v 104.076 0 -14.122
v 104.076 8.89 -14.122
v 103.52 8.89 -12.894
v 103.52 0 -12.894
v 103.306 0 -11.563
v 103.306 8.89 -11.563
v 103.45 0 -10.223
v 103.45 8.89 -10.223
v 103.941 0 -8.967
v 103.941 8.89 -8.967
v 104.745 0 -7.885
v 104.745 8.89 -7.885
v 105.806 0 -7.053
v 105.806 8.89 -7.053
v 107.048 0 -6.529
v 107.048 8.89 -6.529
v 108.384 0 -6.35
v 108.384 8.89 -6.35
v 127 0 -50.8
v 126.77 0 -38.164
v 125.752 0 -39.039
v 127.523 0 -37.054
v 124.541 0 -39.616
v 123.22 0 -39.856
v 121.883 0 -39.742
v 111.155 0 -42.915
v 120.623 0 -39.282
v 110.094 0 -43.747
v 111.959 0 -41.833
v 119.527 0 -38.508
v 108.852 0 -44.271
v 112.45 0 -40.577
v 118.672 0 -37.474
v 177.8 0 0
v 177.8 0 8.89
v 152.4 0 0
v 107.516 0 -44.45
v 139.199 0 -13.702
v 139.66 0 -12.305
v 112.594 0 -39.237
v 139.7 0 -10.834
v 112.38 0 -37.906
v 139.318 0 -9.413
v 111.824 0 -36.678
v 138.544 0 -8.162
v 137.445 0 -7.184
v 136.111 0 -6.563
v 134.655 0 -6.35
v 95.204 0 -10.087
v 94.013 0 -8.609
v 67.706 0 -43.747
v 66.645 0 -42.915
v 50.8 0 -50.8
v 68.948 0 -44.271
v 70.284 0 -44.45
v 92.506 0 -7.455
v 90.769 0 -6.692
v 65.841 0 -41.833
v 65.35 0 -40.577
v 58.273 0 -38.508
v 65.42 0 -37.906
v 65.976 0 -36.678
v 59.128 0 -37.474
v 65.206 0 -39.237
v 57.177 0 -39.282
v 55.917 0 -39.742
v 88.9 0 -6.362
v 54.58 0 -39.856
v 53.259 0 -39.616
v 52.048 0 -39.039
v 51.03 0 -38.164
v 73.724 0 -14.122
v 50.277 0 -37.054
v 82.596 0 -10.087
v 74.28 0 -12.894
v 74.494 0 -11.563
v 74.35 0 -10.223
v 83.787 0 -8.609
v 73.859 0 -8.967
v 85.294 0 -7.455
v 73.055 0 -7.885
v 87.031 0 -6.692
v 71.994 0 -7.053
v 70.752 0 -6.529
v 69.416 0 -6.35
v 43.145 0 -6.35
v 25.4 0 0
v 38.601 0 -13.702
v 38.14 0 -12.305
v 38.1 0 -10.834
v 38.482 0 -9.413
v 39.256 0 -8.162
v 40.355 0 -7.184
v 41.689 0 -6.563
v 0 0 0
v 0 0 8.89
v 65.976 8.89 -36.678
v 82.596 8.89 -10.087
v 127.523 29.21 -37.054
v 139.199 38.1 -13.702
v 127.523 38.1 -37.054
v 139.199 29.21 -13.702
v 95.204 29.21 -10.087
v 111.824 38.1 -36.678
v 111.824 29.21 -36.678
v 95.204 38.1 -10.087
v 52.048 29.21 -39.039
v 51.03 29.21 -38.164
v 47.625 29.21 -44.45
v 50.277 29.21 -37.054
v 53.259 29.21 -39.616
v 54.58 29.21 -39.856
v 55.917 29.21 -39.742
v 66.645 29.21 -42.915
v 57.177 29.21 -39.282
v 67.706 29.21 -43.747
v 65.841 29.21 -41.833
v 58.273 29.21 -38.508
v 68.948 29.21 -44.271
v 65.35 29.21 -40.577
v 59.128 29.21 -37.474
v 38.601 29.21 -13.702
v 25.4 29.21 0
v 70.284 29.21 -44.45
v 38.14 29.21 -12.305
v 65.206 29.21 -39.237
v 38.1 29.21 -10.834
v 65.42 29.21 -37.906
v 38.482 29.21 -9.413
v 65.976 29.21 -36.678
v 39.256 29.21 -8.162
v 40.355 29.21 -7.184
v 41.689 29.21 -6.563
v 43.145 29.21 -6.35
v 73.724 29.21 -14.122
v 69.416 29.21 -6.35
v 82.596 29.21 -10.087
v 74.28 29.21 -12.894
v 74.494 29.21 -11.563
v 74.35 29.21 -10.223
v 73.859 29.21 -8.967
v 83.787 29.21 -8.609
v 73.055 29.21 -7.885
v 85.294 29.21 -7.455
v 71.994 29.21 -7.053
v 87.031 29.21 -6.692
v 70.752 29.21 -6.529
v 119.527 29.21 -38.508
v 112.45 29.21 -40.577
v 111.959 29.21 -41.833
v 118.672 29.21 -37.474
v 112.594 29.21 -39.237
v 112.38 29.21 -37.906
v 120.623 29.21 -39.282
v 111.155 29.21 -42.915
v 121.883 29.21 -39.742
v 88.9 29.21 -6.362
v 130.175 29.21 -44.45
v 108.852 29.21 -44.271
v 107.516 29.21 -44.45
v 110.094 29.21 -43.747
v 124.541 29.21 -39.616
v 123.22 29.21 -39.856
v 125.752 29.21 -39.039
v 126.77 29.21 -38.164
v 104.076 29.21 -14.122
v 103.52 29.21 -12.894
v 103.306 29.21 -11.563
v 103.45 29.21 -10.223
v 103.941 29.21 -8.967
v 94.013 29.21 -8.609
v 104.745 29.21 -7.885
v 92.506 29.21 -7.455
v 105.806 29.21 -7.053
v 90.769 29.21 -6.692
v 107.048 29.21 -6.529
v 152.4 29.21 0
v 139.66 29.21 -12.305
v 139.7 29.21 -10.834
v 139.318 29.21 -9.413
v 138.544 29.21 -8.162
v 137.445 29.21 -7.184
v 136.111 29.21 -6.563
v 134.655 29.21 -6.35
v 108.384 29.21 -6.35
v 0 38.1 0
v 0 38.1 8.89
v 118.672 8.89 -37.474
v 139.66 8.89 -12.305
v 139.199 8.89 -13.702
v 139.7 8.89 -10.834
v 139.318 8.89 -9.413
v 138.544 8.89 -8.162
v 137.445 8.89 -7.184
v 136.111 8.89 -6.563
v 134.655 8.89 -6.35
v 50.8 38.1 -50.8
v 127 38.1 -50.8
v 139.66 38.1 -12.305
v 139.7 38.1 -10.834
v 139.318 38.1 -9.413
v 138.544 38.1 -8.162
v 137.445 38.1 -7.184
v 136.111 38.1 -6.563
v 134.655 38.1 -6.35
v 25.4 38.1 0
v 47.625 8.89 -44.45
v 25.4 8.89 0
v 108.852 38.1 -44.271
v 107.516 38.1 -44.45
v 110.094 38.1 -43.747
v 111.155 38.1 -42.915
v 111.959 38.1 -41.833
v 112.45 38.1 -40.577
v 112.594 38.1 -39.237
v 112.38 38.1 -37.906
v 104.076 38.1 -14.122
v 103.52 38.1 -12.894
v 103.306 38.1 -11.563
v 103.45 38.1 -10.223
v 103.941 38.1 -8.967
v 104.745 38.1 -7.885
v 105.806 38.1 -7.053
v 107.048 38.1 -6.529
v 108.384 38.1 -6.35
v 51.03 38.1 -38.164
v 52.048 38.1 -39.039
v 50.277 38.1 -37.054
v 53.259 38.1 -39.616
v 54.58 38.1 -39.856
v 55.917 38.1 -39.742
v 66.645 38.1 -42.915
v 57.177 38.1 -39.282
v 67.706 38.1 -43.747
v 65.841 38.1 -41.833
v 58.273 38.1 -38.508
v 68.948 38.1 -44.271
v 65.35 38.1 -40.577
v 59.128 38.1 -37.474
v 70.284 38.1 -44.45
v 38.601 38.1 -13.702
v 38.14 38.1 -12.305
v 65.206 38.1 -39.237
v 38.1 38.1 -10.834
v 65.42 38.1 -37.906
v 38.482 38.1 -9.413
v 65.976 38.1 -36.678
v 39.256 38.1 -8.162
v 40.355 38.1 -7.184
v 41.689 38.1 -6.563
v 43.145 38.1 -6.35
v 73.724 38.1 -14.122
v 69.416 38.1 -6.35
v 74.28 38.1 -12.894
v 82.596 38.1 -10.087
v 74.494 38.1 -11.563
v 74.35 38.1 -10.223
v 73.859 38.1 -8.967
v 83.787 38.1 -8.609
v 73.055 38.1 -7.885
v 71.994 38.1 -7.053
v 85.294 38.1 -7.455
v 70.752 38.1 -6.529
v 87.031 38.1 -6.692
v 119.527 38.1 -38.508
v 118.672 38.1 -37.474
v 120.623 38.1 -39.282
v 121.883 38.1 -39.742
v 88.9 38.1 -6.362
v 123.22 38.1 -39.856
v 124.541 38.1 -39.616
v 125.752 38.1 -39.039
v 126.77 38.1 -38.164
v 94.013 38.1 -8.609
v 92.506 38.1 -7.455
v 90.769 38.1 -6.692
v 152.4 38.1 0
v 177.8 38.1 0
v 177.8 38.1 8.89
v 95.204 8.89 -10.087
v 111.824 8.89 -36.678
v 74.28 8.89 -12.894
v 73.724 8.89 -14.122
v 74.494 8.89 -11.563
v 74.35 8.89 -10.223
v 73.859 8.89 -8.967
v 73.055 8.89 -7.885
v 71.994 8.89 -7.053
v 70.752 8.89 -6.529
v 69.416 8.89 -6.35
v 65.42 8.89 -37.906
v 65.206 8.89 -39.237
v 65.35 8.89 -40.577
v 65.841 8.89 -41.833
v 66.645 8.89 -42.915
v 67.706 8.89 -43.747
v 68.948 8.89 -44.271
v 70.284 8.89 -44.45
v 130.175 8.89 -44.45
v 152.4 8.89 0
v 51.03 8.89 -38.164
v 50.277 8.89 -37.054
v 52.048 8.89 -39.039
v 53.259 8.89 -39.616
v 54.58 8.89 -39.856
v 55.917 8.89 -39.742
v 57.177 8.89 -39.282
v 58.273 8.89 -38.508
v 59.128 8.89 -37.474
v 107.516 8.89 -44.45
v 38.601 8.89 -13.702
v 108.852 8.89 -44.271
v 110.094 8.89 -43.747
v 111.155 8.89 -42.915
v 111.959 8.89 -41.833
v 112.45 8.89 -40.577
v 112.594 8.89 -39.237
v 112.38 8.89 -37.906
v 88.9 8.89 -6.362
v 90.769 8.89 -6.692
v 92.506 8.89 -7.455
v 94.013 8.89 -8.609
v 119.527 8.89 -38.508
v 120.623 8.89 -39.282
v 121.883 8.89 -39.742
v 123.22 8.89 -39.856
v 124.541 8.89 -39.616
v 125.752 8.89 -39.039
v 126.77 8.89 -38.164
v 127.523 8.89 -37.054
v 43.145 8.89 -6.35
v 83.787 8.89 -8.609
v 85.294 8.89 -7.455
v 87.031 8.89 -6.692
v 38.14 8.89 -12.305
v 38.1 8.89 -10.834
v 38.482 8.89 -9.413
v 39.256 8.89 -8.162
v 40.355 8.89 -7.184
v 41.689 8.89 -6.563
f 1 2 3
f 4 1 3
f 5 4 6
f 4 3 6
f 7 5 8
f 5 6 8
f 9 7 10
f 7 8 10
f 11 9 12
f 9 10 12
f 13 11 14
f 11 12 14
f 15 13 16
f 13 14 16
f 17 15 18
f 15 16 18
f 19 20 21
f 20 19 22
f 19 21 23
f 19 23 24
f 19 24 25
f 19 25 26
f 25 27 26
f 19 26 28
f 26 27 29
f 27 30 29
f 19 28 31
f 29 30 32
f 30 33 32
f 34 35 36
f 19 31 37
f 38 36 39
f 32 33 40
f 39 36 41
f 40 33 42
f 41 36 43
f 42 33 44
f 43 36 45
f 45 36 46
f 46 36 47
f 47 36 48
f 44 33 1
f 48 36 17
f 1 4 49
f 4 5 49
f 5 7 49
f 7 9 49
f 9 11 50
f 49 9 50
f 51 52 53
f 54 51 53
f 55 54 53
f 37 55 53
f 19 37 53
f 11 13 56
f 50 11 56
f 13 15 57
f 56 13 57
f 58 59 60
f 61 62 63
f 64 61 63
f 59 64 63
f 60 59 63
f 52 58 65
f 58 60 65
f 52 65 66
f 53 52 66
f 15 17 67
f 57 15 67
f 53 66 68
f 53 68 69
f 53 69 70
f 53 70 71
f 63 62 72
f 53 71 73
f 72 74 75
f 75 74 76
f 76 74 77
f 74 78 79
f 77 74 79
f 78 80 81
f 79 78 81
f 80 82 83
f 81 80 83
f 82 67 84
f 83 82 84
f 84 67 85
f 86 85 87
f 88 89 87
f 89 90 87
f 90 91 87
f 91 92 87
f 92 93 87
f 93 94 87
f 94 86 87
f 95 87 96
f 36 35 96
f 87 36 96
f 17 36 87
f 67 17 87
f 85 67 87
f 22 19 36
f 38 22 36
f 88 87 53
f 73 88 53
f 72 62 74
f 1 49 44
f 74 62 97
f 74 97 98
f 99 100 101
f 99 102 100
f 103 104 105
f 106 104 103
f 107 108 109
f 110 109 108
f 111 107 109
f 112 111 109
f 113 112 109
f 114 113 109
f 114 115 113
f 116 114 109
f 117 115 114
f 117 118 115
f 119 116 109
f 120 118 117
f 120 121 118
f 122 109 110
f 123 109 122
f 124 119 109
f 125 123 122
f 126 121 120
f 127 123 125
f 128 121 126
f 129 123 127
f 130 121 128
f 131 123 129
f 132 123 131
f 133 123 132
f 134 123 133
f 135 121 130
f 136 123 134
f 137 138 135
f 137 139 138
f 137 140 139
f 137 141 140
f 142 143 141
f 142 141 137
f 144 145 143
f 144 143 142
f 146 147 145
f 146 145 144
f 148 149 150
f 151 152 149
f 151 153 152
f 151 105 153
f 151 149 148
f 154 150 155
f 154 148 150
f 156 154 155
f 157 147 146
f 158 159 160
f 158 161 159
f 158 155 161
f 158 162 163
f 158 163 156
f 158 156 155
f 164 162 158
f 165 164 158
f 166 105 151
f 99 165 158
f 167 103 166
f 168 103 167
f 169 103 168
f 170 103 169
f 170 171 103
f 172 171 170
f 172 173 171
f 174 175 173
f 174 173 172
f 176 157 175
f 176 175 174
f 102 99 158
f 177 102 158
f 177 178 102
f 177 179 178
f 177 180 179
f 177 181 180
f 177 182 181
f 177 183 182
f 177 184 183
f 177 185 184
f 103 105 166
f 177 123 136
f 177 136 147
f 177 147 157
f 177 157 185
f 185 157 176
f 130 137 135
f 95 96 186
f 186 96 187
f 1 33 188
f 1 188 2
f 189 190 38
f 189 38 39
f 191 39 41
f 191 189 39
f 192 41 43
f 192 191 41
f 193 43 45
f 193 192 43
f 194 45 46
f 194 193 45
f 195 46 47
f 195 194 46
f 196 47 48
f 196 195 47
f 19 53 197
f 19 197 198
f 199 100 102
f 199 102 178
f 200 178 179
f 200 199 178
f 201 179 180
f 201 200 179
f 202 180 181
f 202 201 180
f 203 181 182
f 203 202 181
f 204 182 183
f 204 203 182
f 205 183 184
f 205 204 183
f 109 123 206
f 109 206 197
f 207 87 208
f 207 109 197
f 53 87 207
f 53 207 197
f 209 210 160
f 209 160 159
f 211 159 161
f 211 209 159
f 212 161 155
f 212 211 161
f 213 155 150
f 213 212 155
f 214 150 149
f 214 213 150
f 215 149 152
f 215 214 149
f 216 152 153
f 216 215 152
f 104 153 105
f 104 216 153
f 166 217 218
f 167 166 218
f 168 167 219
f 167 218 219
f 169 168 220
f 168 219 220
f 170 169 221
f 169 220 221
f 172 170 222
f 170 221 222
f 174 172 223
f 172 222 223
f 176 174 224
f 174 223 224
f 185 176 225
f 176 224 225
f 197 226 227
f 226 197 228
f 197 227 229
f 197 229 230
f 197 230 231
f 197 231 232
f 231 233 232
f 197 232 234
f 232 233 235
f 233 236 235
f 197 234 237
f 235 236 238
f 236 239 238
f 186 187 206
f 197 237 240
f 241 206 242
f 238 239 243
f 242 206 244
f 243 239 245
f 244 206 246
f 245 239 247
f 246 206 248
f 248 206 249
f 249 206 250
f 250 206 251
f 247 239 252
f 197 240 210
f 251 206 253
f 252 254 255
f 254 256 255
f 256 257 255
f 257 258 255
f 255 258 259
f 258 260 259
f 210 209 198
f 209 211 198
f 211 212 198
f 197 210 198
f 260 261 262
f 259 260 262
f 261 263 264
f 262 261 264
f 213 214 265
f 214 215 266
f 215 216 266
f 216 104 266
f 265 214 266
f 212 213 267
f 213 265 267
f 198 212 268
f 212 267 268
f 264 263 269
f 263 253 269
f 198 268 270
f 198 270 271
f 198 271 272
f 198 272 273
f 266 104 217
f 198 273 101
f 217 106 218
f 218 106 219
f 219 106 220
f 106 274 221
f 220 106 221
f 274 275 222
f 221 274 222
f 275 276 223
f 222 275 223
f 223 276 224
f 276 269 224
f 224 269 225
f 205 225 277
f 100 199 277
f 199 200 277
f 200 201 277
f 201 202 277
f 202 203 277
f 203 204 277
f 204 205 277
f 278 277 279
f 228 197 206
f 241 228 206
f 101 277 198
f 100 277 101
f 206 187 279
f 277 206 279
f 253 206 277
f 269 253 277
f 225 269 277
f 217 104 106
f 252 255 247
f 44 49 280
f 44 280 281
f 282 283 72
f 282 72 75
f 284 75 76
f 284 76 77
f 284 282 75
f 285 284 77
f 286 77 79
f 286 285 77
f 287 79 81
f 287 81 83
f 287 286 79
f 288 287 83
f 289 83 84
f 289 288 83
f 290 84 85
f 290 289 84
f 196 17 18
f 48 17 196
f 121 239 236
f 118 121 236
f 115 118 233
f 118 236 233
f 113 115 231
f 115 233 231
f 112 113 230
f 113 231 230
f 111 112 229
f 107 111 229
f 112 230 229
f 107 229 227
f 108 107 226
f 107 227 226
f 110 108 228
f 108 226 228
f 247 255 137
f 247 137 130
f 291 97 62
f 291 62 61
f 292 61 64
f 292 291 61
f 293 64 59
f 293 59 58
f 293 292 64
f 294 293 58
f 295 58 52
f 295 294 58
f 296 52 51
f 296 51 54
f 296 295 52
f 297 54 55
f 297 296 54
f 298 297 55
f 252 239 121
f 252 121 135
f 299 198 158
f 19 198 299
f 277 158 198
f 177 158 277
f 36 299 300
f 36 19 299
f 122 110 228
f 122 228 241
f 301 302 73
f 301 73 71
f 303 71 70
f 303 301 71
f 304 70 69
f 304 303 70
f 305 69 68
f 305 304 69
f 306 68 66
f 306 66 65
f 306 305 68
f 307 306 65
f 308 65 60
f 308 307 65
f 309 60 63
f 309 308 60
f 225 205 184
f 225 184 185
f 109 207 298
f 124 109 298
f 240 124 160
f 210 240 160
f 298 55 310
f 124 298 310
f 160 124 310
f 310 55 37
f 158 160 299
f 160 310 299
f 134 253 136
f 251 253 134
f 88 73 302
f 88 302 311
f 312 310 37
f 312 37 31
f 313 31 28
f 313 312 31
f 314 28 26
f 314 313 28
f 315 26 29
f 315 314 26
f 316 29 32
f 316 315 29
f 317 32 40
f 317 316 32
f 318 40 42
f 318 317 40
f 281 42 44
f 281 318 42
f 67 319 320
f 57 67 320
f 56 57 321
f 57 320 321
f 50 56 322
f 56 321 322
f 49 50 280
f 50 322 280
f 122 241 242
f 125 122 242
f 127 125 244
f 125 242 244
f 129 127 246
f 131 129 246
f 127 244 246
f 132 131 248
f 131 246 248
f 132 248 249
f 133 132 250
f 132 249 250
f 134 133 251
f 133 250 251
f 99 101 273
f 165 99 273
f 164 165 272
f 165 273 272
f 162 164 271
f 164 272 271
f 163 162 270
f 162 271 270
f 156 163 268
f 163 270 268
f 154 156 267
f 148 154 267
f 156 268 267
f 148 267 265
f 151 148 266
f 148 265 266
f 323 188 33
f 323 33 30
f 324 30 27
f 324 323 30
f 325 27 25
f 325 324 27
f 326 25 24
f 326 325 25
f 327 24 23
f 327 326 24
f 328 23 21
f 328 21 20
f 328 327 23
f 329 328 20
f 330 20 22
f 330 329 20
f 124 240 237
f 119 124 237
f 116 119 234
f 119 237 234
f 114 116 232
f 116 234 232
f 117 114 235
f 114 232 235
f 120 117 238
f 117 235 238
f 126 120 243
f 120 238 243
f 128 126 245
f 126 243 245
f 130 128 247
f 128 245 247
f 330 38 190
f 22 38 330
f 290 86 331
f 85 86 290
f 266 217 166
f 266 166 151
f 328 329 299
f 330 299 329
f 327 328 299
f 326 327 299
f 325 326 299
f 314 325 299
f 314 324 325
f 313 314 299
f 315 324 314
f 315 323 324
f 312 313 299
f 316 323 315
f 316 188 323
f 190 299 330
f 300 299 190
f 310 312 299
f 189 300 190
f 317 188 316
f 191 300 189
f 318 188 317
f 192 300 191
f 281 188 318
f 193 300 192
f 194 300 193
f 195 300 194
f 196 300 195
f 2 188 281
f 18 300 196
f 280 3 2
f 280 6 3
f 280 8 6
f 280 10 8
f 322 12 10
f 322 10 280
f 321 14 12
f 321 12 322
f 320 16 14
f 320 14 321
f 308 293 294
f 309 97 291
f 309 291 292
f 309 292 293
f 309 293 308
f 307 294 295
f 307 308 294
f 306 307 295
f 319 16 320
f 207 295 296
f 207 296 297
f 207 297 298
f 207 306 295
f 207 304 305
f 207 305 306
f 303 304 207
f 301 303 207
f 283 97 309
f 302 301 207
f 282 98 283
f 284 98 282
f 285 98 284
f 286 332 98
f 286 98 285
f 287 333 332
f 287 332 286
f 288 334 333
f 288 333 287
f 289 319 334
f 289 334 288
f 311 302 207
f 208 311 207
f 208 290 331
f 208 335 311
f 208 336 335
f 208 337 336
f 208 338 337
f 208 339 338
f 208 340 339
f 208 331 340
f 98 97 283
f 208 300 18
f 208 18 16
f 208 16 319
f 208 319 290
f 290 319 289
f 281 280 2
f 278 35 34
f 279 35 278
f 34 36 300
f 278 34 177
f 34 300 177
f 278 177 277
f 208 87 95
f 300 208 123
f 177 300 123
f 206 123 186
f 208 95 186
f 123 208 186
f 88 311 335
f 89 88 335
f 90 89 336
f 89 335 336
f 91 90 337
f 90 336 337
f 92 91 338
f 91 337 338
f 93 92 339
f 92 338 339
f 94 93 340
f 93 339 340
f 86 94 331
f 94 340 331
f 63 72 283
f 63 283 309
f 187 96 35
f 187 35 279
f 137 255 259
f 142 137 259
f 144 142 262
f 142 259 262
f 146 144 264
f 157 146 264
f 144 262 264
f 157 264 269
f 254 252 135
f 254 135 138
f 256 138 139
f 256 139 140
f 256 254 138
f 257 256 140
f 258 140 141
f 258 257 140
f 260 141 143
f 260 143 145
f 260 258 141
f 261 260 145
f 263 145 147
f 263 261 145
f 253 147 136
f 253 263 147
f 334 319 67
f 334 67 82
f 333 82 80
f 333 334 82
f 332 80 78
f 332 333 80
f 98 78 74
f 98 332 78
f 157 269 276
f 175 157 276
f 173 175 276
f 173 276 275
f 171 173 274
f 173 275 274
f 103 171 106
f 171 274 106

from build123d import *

# Parameters (mm, degrees)
F0_W          = 38.1
F0_H          = 8.89
F1_DEPTH      = 177.8
F3_DEPTH      = 8.89
F5_DEPTH      = 8.89
F7_DEPTH      = 38.1
F10_DEPTH     = 20.32
F12_DEPTH     = 20.32
F13_T1_DEPTH  = 8.89
F13_T3_DEPTH  = 8.89
F13_T8_DEPTH  = 31.5348218608
F13_T13_DEPTH = 31.5348218608
F13_T18_DEPTH = 31.5348218608
F13_T23_DEPTH = 31.8039450471
F13_T28_DEPTH = 29.4390316571
F13_T33_DEPTH = 31.5348218608
F13_T38_DEPTH = 29.4390316571
F13_T43_DEPTH = 31.8039450471
F13_T48_DEPTH = 31.8039450471
F13_T53_DEPTH = 29.4390316571
F13_T58_DEPTH = 31.8039450471
F13_T63_DEPTH = 29.4390316571
F13_T68_DEPTH = 31.8039450471
F13_T73_DEPTH = 31.8039450471
F13_T78_DEPTH = 31.8039450471
F13_T83_DEPTH = 31.8039450471
F14_T1_DEPTH  = 8.89
F14_T3_DEPTH  = 8.89


# Not quite as in the source:
# - a fillet or chamfer that OpenCascade refuses, or shapes differently, is made with other operations: its cross-section is extruded or revolved along the edge and cut away or added


with BuildPart() as f1:
    # F0 (on Right) → F1 (new body)
    with BuildSketch(Plane.YZ):
        with Locations((19.05, 4.445)):
            Rectangle(F0_W, F0_H)
    extrude(amount=F1_DEPTH)

    # F2 (on face) → F3 (join)
    with BuildSketch(Plane.XZ):
        Polygon((82.55, 0), (31.75, 0), (34.925, -6.35), (78.58125, -6.35), align=None)
        Polygon((88.9, 0), (82.55, 0), (78.58125, -6.35), (84.93125, -6.35), align=None)
        Polygon((92.86875, -6.35), (88.9, 0), (84.93125, -6.35), align=None)
        Polygon((95.25, 0), (88.9, 0), (92.86875, -6.35), (99.21875, -6.35), align=None)
        Polygon((146.05, 0), (95.25, 0), (99.21875, -6.35), (142.875, -6.35), align=None)
        Polygon((149.225, -6.35), (152.4, 0), (146.05, 0), (142.875, -6.35), align=None)
        Polygon((130.175, -44.45), (149.225, -6.35), (142.875, -6.35), (123.825, -44.45), align=None)
        Polygon((127, -50.8), (130.175, -44.45), (123.825, -44.45), (123.4722222222, -45.1555555556), align=None)
        Polygon((123.4722222222, -45.1555555556), (120.65, -50.8), (127, -50.8), align=None)
        Polygon((123.03125, -44.45), (116.68125, -44.45), (120.65, -50.8), (123.4722222222, -45.1555555556), align=None)
        Polygon((99.21875, -6.35), (92.86875, -6.35), (116.68125, -44.45), (123.03125, -44.45), align=None)
        Polygon((61.11875, -44.45), (57.15, -50.8), (88.9, -50.8), (120.65, -50.8), (116.68125, -44.45), align=None)
        Polygon((84.93125, -6.35), (78.58125, -6.35), (54.76875, -44.45), (61.11875, -44.45), align=None)
        Polygon((54.3277777778, -45.1555555556), (57.15, -50.8), (61.11875, -44.45), (54.76875, -44.45), align=None)
        Polygon((54.3277777778, -45.1555555556), (50.8, -50.8), (57.15, -50.8), align=None)
        Polygon((34.925, -6.35), (28.575, -6.35), (47.625, -44.45), (53.975, -44.45), align=None)
        Polygon((31.75, 0), (25.4, 0), (28.575, -6.35), (34.925, -6.35), align=None)
        Polygon((53.975, -44.45), (47.625, -44.45), (50.8, -50.8), (54.3277777778, -45.1555555556), align=None)
    extrude(amount=-F3_DEPTH)

    # F4 (on face) → F5 (join)
    with BuildSketch(Plane(origin=(0, 38.1, 0), x_dir=(-1, 0, 0), z_dir=(0, 1, 0))):
        Polygon((-95.25, 0), (-146.05, 0), (-142.875, -6.35), (-99.21875, -6.35), align=None)
        Polygon((-146.05, 0), (-152.4, 0), (-149.225, -6.35), (-142.875, -6.35), align=None)
        Polygon((-88.9, 0), (-95.25, 0), (-99.21875, -6.35), (-92.86875, -6.35), align=None)
        Polygon((-84.93125, -6.35), (-88.9, 0), (-92.86875, -6.35), align=None)
        Polygon((-82.55, 0), (-88.9, 0), (-84.93125, -6.35), (-78.58125, -6.35), align=None)
        Polygon((-31.75, 0), (-82.55, 0), (-78.58125, -6.35), (-34.925, -6.35), align=None)
        Polygon((-25.4, 0), (-31.75, 0), (-34.925, -6.35), (-28.575, -6.35), align=None)
        Polygon((-28.575, -6.35), (-34.925, -6.35), (-53.975, -44.45), (-47.625, -44.45), align=None)
        Polygon((-54.3277777778, -45.1555555556), (-50.8, -50.8), (-47.625, -44.45), (-53.975, -44.45), align=None)
        Polygon((-54.3277777778, -45.1555555556), (-57.15, -50.8), (-50.8, -50.8), align=None)
        Polygon((-61.11875, -44.45), (-57.15, -50.8), (-54.3277777778, -45.1555555556), (-54.76875, -44.45), align=None)
        Polygon((-78.58125, -6.35), (-84.93125, -6.35), (-61.11875, -44.45), (-54.76875, -44.45), align=None)
        Polygon((-116.68125, -44.45), (-120.65, -50.8), (-57.15, -50.8), (-61.11875, -44.45), align=None)
        Polygon((-92.86875, -6.35), (-99.21875, -6.35), (-123.03125, -44.45), (-116.68125, -44.45), align=None)
        Polygon((-123.4722222222, -45.1555555556), (-120.65, -50.8), (-116.68125, -44.45), (-123.03125, -44.45), align=None)
        Polygon((-123.4722222222, -45.1555555556), (-127, -50.8), (-120.65, -50.8), align=None)
        Polygon((-123.825, -44.45), (-130.175, -44.45), (-127, -50.8), (-123.4722222222, -45.1555555556), align=None)
        Polygon((-142.875, -6.35), (-149.225, -6.35), (-130.175, -44.45), (-123.825, -44.45), align=None)
    extrude(amount=-F5_DEPTH)

    # F6 (on face) → F7 (join)
    with BuildSketch(Plane.XZ):
        Polygon((53.975, -44.45), (47.625, -44.45), (50.8, -50.8), (127, -50.8), (130.175, -44.45), (123.825, -44.45), (123.4722222222, -45.1555555556), (123.03125, -44.45), (116.68125, -44.45), (61.11875, -44.45), (54.76875, -44.45), (54.3277777778, -45.1555555556), align=None)
    extrude(amount=-F7_DEPTH)

    # F9 (on offset) → F10 (join)
    with BuildSketch(Plane(origin=(0, 8.89, 0), x_dir=(-1, 0, 0), z_dir=(0, 1, 0))):
        Polygon((-123.825, -44.45), (-123.4722222222, -45.1555555556), (-123.03125, -44.45), align=None)
    extrude(amount=F10_DEPTH)

    # F11 (on offset) → F12 (join)
    with BuildSketch(Plane(origin=(0, 8.89, 0), x_dir=(-1, 0, 0), z_dir=(0, 1, 0))):
        Polygon((-54.76875, -44.45), (-54.3277777778, -45.1555555556), (-53.975, -44.45), align=None)
    extrude(amount=F12_DEPTH)

    # F13: fillet of radius 5.08 on 16 edges, made by hand

    # F13_s2 → F13_t1 (join)
    with BuildSketch(Plane.XZ.offset(-8.89)):
        with BuildLine():
            ThreePointArc((50.2769488963, -37.0538977925), (54.5795522828, -39.8563287528), (59.1284704109, -37.4744473426))
            Line((59.1284704109, -37.4744473426), (54.3277777778, -45.1555555556))
            Line((54.3277777778, -45.1555555556), (50.2769488963, -37.0538977925))
        make_face()
        with BuildLine():
            ThreePointArc((118.6715295891, -37.4744473426), (123.2204477172, -39.8563287528), (127.5230511037, -37.0538977925))
            Line((127.5230511037, -37.0538977925), (123.4722222222, -45.1555555556))
            Line((123.4722222222, -45.1555555556), (118.6715295891, -37.4744473426))
        make_face()
        with BuildLine():
            ThreePointArc((73.7235033655, -14.1223946152), (73.8588557859, -8.9673758554), (69.4156719811, -6.35))
            Line((69.4156719811, -6.35), (78.58125, -6.35))
            Line((78.58125, -6.35), (73.7235033655, -14.1223946152))
        make_face()
        with BuildLine():
            ThreePointArc((38.6009225326, -13.7018450651), (38.8233065564, -8.7592859504), (43.1446126628, -6.35))
            Line((43.1446126628, -6.35), (34.925, -6.35))
            Line((34.925, -6.35), (38.6009225326, -13.7018450651))
        make_face()
        with BuildLine():
            ThreePointArc((104.0764966345, -14.1223946152), (103.9411442141, -8.9673758554), (108.3843280189, -6.35))
            Line((108.3843280189, -6.35), (99.21875, -6.35))
            Line((99.21875, -6.35), (104.0764966345, -14.1223946152))
        make_face()
        with BuildLine():
            ThreePointArc((139.1990774674, -13.7018450651), (138.9766934436, -8.7592859504), (134.6553873372, -6.35))
            Line((134.6553873372, -6.35), (142.875, -6.35))
            Line((142.875, -6.35), (139.1990774674, -13.7018450651))
        make_face()
        with BuildLine():
            ThreePointArc((65.9764966345, -36.6776053848), (65.8411442141, -41.8326241446), (70.2843280189, -44.45))
            Line((70.2843280189, -44.45), (61.11875, -44.45))
            Line((61.11875, -44.45), (65.9764966345, -36.6776053848))
        make_face()
        with BuildLine():
            ThreePointArc((107.5156719811, -44.45), (111.9588557859, -41.8326241446), (111.8235033655, -36.6776053848))
            Line((111.8235033655, -36.6776053848), (116.68125, -44.45))
            Line((116.68125, -44.45), (107.5156719811, -44.45))
        make_face()
    extrude(amount=F13_T1_DEPTH)

    # F13_s4 → F13_t3 (join)
    with BuildSketch(Plane.XZ.offset(-38.1)):
        with BuildLine():
            ThreePointArc((127.5230511037, -37.0538977925), (123.2204477172, -39.8563287528), (118.6715295891, -37.4744473426))
            Line((118.6715295891, -37.4744473426), (123.4722222222, -45.1555555556))
            Line((123.4722222222, -45.1555555556), (127.5230511037, -37.0538977925))
        make_face()
        with BuildLine():
            ThreePointArc((104.0764966345, -14.1223946152), (103.9411442141, -8.9673758554), (108.3843280189, -6.35))
            Line((108.3843280189, -6.35), (99.21875, -6.35))
            Line((99.21875, -6.35), (104.0764966345, -14.1223946152))
        make_face()
        with BuildLine():
            ThreePointArc((38.6009225326, -13.7018450651), (38.8233065564, -8.7592859504), (43.1446126628, -6.35))
            Line((43.1446126628, -6.35), (34.925, -6.35))
            Line((34.925, -6.35), (38.6009225326, -13.7018450651))
        make_face()
        with BuildLine():
            ThreePointArc((59.1284704109, -37.4744473426), (54.5795522828, -39.8563287528), (50.2769488963, -37.0538977925))
            Line((50.2769488963, -37.0538977925), (54.3277777778, -45.1555555556))
            Line((54.3277777778, -45.1555555556), (59.1284704109, -37.4744473426))
        make_face()
        with BuildLine():
            ThreePointArc((139.1990774674, -13.7018450651), (138.9766934436, -8.7592859504), (134.6553873372, -6.35))
            Line((134.6553873372, -6.35), (142.875, -6.35))
            Line((142.875, -6.35), (139.1990774674, -13.7018450651))
        make_face()
        with BuildLine():
            ThreePointArc((73.7235033655, -14.1223946152), (73.8588557859, -8.9673758554), (69.4156719811, -6.35))
            Line((69.4156719811, -6.35), (78.58125, -6.35))
            Line((78.58125, -6.35), (73.7235033655, -14.1223946152))
        make_face()
        with BuildLine():
            ThreePointArc((107.5156719811, -44.45), (111.9588557859, -41.8326241446), (111.8235033655, -36.6776053848))
            Line((111.8235033655, -36.6776053848), (116.68125, -44.45))
            Line((116.68125, -44.45), (107.5156719811, -44.45))
        make_face()
        with BuildLine():
            ThreePointArc((70.2843280189, -44.45), (65.8411442141, -41.8326241446), (65.9764966345, -36.6776053848))
            Line((65.9764966345, -36.6776053848), (61.11875, -44.45))
            Line((61.11875, -44.45), (70.2843280189, -44.45))
        make_face()
    extrude(amount=F13_T3_DEPTH)


with BuildPart() as f13_tool6:
    # F13_s7 → F13_t8 (new body)
    with BuildSketch(Plane.XZ):
        with BuildLine():
            ThreePointArc((50.2769488963, -37.0538977925), (54.5795522828, -39.8563287528), (59.1284704109, -37.4744473426))
            Line((59.1284704109, -37.4744473426), (54.3277777778, -45.1555555556))
            Line((54.3277777778, -45.1555555556), (50.2769488963, -37.0538977925))
        make_face()
    extrude(amount=-F13_T8_DEPTH)

    split(bisect_by=Plane.XZ.offset(-29.21), keep=Keep.BOTTOM)


with BuildPart() as f1_1:
    add(f1.part)

    # F13_t5: union F13_tool6
    add(f13_tool6.part)


with BuildPart() as f13_tool11:
    # F13_s12 → F13_t13 (new body)
    with BuildSketch(Plane.XZ):
        with BuildLine():
            ThreePointArc((118.6715295891, -37.4744473426), (123.2204477172, -39.8563287528), (127.5230511037, -37.0538977925))
            Line((127.5230511037, -37.0538977925), (123.4722222222, -45.1555555556))
            Line((123.4722222222, -45.1555555556), (118.6715295891, -37.4744473426))
        make_face()
    extrude(amount=-F13_T13_DEPTH)

    split(bisect_by=Plane.XZ.offset(-29.21), keep=Keep.BOTTOM)


with BuildPart() as f1_2:
    add(f1_1.part)

    # F13_t10: union F13_tool11
    add(f13_tool11.part)


with BuildPart() as f13_tool16:
    # F13_s17 → F13_t18 (new body)
    with BuildSketch(Plane.XZ.offset(-6.5651781392)):
        with BuildLine():
            ThreePointArc((127.5230511037, -37.0538977925), (123.2204477172, -39.8563287528), (118.6715295891, -37.4744473426))
            Line((118.6715295891, -37.4744473426), (123.4722222222, -45.1555555556))
            Line((123.4722222222, -45.1555555556), (127.5230511037, -37.0538977925))
        make_face()
    extrude(amount=-F13_T18_DEPTH)

    split(bisect_by=Plane.XZ.offset(-8.89), keep=Keep.TOP)


with BuildPart() as f1_3:
    add(f1_2.part)

    # F13_t15: union F13_tool16
    add(f13_tool16.part)


with BuildPart() as f13_tool21:
    # F13_s22 → F13_t23 (new body)
    with BuildSketch(Plane.XZ.offset(-38.1)):
        with BuildLine():
            ThreePointArc((104.0764966345, -14.1223946152), (103.9411442141, -8.9673758554), (108.3843280189, -6.35))
            Line((108.3843280189, -6.35), (99.21875, -6.35))
            Line((99.21875, -6.35), (104.0764966345, -14.1223946152))
        make_face()
    extrude(amount=F13_T23_DEPTH)

    split(bisect_by=Plane.XZ.offset(-8.89), keep=Keep.TOP)


with BuildPart() as f1_4:
    add(f1_3.part)

    # F13_t20: union F13_tool21
    add(f13_tool21.part)


with BuildPart() as f13_tool26:
    # F13_s27 → F13_t28 (new body)
    with BuildSketch(Plane.XZ.offset(-38.1)):
        with BuildLine():
            ThreePointArc((38.6009225326, -13.7018450651), (38.8233065564, -8.7592859504), (43.1446126628, -6.35))
            Line((43.1446126628, -6.35), (34.925, -6.35))
            Line((34.925, -6.35), (38.6009225326, -13.7018450651))
        make_face()
    extrude(amount=F13_T28_DEPTH)

    split(bisect_by=Plane.XZ.offset(-8.89), keep=Keep.TOP)


with BuildPart() as f1_5:
    add(f1_4.part)

    # F13_t25: union F13_tool26
    add(f13_tool26.part)


with BuildPart() as f13_tool31:
    # F13_s32 → F13_t33 (new body)
    with BuildSketch(Plane.XZ.offset(-6.5651781392)):
        with BuildLine():
            ThreePointArc((59.1284704109, -37.4744473426), (54.5795522828, -39.8563287528), (50.2769488963, -37.0538977925))
            Line((50.2769488963, -37.0538977925), (54.3277777778, -45.1555555556))
            Line((54.3277777778, -45.1555555556), (59.1284704109, -37.4744473426))
        make_face()
    extrude(amount=-F13_T33_DEPTH)

    split(bisect_by=Plane.XZ.offset(-8.89), keep=Keep.TOP)


with BuildPart() as f1_6:
    add(f1_5.part)

    # F13_t30: union F13_tool31
    add(f13_tool31.part)


with BuildPart() as f13_tool36:
    # F13_s37 → F13_t38 (new body)
    with BuildSketch(Plane.XZ.offset(-38.1)):
        with BuildLine():
            ThreePointArc((139.1990774674, -13.7018450651), (138.9766934436, -8.7592859504), (134.6553873372, -6.35))
            Line((134.6553873372, -6.35), (142.875, -6.35))
            Line((142.875, -6.35), (139.1990774674, -13.7018450651))
        make_face()
    extrude(amount=F13_T38_DEPTH)

    split(bisect_by=Plane.XZ.offset(-8.89), keep=Keep.TOP)


with BuildPart() as f1_7:
    add(f1_6.part)

    # F13_t35: union F13_tool36
    add(f13_tool36.part)


with BuildPart() as f13_tool41:
    # F13_s42 → F13_t43 (new body)
    with BuildSketch(Plane.XZ.offset(-38.1)):
        with BuildLine():
            ThreePointArc((73.7235033655, -14.1223946152), (73.8588557859, -8.9673758554), (69.4156719811, -6.35))
            Line((69.4156719811, -6.35), (78.58125, -6.35))
            Line((78.58125, -6.35), (73.7235033655, -14.1223946152))
        make_face()
    extrude(amount=F13_T43_DEPTH)

    split(bisect_by=Plane.XZ.offset(-8.89), keep=Keep.TOP)


with BuildPart() as f1_8:
    add(f1_7.part)

    # F13_t40: union F13_tool41
    add(f13_tool41.part)


with BuildPart() as f13_tool46:
    # F13_s47 → F13_t48 (new body)
    with BuildSketch(Plane.XZ):
        with BuildLine():
            ThreePointArc((73.7235033655, -14.1223946152), (73.8588557859, -8.9673758554), (69.4156719811, -6.35))
            Line((69.4156719811, -6.35), (78.58125, -6.35))
            Line((78.58125, -6.35), (73.7235033655, -14.1223946152))
        make_face()
    extrude(amount=-F13_T48_DEPTH)

    split(bisect_by=Plane.XZ.offset(-29.21), keep=Keep.BOTTOM)


with BuildPart() as f1_9:
    add(f1_8.part)

    # F13_t45: union F13_tool46
    add(f13_tool46.part)


with BuildPart() as f13_tool51:
    # F13_s52 → F13_t53 (new body)
    with BuildSketch(Plane.XZ):
        with BuildLine():
            ThreePointArc((38.6009225326, -13.7018450651), (38.8233065564, -8.7592859504), (43.1446126628, -6.35))
            Line((43.1446126628, -6.35), (34.925, -6.35))
            Line((34.925, -6.35), (38.6009225326, -13.7018450651))
        make_face()
    extrude(amount=-F13_T53_DEPTH)

    split(bisect_by=Plane.XZ.offset(-29.21), keep=Keep.BOTTOM)


with BuildPart() as f1_10:
    add(f1_9.part)

    # F13_t50: union F13_tool51
    add(f13_tool51.part)


with BuildPart() as f13_tool56:
    # F13_s57 → F13_t58 (new body)
    with BuildSketch(Plane.XZ):
        with BuildLine():
            ThreePointArc((104.0764966345, -14.1223946152), (103.9411442141, -8.9673758554), (108.3843280189, -6.35))
            Line((108.3843280189, -6.35), (99.21875, -6.35))
            Line((99.21875, -6.35), (104.0764966345, -14.1223946152))
        make_face()
    extrude(amount=-F13_T58_DEPTH)

    split(bisect_by=Plane.XZ.offset(-29.21), keep=Keep.BOTTOM)


with BuildPart() as f1_11:
    add(f1_10.part)

    # F13_t55: union F13_tool56
    add(f13_tool56.part)


with BuildPart() as f13_tool61:
    # F13_s62 → F13_t63 (new body)
    with BuildSketch(Plane.XZ):
        with BuildLine():
            ThreePointArc((139.1990774674, -13.7018450651), (138.9766934436, -8.7592859504), (134.6553873372, -6.35))
            Line((134.6553873372, -6.35), (142.875, -6.35))
            Line((142.875, -6.35), (139.1990774674, -13.7018450651))
        make_face()
    extrude(amount=-F13_T63_DEPTH)

    split(bisect_by=Plane.XZ.offset(-29.21), keep=Keep.BOTTOM)


with BuildPart() as f1_12:
    add(f1_11.part)

    # F13_t60: union F13_tool61
    add(f13_tool61.part)


with BuildPart() as f13_tool66:
    # F13_s67 → F13_t68 (new body)
    with BuildSketch(Plane.XZ):
        with BuildLine():
            ThreePointArc((65.9764966345, -36.6776053848), (65.8411442141, -41.8326241446), (70.2843280189, -44.45))
            Line((70.2843280189, -44.45), (61.11875, -44.45))
            Line((61.11875, -44.45), (65.9764966345, -36.6776053848))
        make_face()
    extrude(amount=-F13_T68_DEPTH)

    split(bisect_by=Plane.XZ.offset(-29.21), keep=Keep.BOTTOM)


with BuildPart() as f1_13:
    add(f1_12.part)

    # F13_t65: union F13_tool66
    add(f13_tool66.part)


with BuildPart() as f13_tool71:
    # F13_s72 → F13_t73 (new body)
    with BuildSketch(Plane.XZ):
        with BuildLine():
            ThreePointArc((107.5156719811, -44.45), (111.9588557859, -41.8326241446), (111.8235033655, -36.6776053848))
            Line((111.8235033655, -36.6776053848), (116.68125, -44.45))
            Line((116.68125, -44.45), (107.5156719811, -44.45))
        make_face()
    extrude(amount=-F13_T73_DEPTH)

    split(bisect_by=Plane.XZ.offset(-29.21), keep=Keep.BOTTOM)


with BuildPart() as f1_14:
    add(f1_13.part)

    # F13_t70: union F13_tool71
    add(f13_tool71.part)


with BuildPart() as f13_tool76:
    # F13_s77 → F13_t78 (new body)
    with BuildSketch(Plane.XZ.offset(-38.1)):
        with BuildLine():
            ThreePointArc((107.5156719811, -44.45), (111.9588557859, -41.8326241446), (111.8235033655, -36.6776053848))
            Line((111.8235033655, -36.6776053848), (116.68125, -44.45))
            Line((116.68125, -44.45), (107.5156719811, -44.45))
        make_face()
    extrude(amount=F13_T78_DEPTH)

    split(bisect_by=Plane.XZ.offset(-8.89), keep=Keep.TOP)


with BuildPart() as f1_15:
    add(f1_14.part)

    # F13_t75: union F13_tool76
    add(f13_tool76.part)


with BuildPart() as f13_tool81:
    # F13_s82 → F13_t83 (new body)
    with BuildSketch(Plane.XZ.offset(-38.1)):
        with BuildLine():
            ThreePointArc((70.2843280189, -44.45), (65.8411442141, -41.8326241446), (65.9764966345, -36.6776053848))
            Line((65.9764966345, -36.6776053848), (61.11875, -44.45))
            Line((61.11875, -44.45), (70.2843280189, -44.45))
        make_face()
    extrude(amount=F13_T83_DEPTH)

    split(bisect_by=Plane.XZ.offset(-8.89), keep=Keep.TOP)


with BuildPart() as f1_16:
    add(f1_15.part)

    # F13_t80: union F13_tool81
    add(f13_tool81.part)

    # F14: fillet of radius 7.9502 on 4 edges, made by hand

    # F14_s2 → F14_t1 (join)
    with BuildSketch(Plane.XZ.offset(-8.89)):
        with BuildLine():
            ThreePointArc((89.3376295995, -6.35), (85.4836228133, -7.3466173456), (82.595873483, -10.0866024272))
            Line((82.595873483, -10.0866024272), (84.93125, -6.35))
            Line((84.93125, -6.35), (89.3376295995, -6.35))
        make_face()
        with BuildLine():
            ThreePointArc((88.4623704005, -6.35), (92.3163771867, -7.3466173456), (95.204126517, -10.0866024272))
            Line((95.204126517, -10.0866024272), (92.86875, -6.35))
            Line((92.86875, -6.35), (88.4623704005, -6.35))
        make_face()
    extrude(amount=F14_T1_DEPTH)

    # F14_s4 → F14_t3 (join)
    with BuildSketch(Plane.XZ.offset(-38.1)):
        with BuildLine():
            ThreePointArc((82.595873483, -10.0866024272), (85.4836228133, -7.3466173456), (89.3376295995, -6.35))
            Line((89.3376295995, -6.35), (84.93125, -6.35))
            Line((84.93125, -6.35), (82.595873483, -10.0866024272))
        make_face()
        with BuildLine():
            ThreePointArc((88.4623704005, -6.35), (92.3163771867, -7.3466173456), (95.204126517, -10.0866024272))
            Line((95.204126517, -10.0866024272), (92.86875, -6.35))
            Line((92.86875, -6.35), (88.4623704005, -6.35))
        make_face()
    extrude(amount=F14_T3_DEPTH)


solid = f1_16.part
